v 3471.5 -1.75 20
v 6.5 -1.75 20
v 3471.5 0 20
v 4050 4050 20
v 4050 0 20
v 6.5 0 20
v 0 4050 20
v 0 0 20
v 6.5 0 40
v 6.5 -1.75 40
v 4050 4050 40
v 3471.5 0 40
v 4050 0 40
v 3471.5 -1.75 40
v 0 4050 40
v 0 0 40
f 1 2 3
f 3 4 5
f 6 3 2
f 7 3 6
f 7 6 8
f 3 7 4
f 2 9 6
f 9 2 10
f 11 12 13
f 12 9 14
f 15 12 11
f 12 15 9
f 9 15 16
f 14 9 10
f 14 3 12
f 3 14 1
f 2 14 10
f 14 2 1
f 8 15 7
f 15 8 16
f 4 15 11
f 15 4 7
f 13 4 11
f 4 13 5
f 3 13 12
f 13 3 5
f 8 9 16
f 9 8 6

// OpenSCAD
// Dimensions in mm
X = 90;
Y = 45;
Z = 20;

// Slide dimensions
slide_X = 75;
slide_Y = 25;
slide_Z = 1;

// Slot dimensions
slot_X = slide_X + 2; // slot length is slide length plus 2mm on each side
slot_Y = 1.6;
slot_Z = 10;
slot_gap_Y = 3.5;

// Build the base block
translate([0, 0, Z]) {
    linear_extrude(Z) {
        square(X * Y);
    }
}

// Cut parallel slots into the top face
translate([X/2 - slot_X/2, Y/2 - (Y/2 + slot_gap_Y/2), 0]) { // moved to z=0
    for (y = [0, slot_gap_Y]) {
        translate([0, y, Z]) // added Z to ensure correct height
            linear_extrude(Z) {
                square(slot_X * Y);
            }
    }
}
